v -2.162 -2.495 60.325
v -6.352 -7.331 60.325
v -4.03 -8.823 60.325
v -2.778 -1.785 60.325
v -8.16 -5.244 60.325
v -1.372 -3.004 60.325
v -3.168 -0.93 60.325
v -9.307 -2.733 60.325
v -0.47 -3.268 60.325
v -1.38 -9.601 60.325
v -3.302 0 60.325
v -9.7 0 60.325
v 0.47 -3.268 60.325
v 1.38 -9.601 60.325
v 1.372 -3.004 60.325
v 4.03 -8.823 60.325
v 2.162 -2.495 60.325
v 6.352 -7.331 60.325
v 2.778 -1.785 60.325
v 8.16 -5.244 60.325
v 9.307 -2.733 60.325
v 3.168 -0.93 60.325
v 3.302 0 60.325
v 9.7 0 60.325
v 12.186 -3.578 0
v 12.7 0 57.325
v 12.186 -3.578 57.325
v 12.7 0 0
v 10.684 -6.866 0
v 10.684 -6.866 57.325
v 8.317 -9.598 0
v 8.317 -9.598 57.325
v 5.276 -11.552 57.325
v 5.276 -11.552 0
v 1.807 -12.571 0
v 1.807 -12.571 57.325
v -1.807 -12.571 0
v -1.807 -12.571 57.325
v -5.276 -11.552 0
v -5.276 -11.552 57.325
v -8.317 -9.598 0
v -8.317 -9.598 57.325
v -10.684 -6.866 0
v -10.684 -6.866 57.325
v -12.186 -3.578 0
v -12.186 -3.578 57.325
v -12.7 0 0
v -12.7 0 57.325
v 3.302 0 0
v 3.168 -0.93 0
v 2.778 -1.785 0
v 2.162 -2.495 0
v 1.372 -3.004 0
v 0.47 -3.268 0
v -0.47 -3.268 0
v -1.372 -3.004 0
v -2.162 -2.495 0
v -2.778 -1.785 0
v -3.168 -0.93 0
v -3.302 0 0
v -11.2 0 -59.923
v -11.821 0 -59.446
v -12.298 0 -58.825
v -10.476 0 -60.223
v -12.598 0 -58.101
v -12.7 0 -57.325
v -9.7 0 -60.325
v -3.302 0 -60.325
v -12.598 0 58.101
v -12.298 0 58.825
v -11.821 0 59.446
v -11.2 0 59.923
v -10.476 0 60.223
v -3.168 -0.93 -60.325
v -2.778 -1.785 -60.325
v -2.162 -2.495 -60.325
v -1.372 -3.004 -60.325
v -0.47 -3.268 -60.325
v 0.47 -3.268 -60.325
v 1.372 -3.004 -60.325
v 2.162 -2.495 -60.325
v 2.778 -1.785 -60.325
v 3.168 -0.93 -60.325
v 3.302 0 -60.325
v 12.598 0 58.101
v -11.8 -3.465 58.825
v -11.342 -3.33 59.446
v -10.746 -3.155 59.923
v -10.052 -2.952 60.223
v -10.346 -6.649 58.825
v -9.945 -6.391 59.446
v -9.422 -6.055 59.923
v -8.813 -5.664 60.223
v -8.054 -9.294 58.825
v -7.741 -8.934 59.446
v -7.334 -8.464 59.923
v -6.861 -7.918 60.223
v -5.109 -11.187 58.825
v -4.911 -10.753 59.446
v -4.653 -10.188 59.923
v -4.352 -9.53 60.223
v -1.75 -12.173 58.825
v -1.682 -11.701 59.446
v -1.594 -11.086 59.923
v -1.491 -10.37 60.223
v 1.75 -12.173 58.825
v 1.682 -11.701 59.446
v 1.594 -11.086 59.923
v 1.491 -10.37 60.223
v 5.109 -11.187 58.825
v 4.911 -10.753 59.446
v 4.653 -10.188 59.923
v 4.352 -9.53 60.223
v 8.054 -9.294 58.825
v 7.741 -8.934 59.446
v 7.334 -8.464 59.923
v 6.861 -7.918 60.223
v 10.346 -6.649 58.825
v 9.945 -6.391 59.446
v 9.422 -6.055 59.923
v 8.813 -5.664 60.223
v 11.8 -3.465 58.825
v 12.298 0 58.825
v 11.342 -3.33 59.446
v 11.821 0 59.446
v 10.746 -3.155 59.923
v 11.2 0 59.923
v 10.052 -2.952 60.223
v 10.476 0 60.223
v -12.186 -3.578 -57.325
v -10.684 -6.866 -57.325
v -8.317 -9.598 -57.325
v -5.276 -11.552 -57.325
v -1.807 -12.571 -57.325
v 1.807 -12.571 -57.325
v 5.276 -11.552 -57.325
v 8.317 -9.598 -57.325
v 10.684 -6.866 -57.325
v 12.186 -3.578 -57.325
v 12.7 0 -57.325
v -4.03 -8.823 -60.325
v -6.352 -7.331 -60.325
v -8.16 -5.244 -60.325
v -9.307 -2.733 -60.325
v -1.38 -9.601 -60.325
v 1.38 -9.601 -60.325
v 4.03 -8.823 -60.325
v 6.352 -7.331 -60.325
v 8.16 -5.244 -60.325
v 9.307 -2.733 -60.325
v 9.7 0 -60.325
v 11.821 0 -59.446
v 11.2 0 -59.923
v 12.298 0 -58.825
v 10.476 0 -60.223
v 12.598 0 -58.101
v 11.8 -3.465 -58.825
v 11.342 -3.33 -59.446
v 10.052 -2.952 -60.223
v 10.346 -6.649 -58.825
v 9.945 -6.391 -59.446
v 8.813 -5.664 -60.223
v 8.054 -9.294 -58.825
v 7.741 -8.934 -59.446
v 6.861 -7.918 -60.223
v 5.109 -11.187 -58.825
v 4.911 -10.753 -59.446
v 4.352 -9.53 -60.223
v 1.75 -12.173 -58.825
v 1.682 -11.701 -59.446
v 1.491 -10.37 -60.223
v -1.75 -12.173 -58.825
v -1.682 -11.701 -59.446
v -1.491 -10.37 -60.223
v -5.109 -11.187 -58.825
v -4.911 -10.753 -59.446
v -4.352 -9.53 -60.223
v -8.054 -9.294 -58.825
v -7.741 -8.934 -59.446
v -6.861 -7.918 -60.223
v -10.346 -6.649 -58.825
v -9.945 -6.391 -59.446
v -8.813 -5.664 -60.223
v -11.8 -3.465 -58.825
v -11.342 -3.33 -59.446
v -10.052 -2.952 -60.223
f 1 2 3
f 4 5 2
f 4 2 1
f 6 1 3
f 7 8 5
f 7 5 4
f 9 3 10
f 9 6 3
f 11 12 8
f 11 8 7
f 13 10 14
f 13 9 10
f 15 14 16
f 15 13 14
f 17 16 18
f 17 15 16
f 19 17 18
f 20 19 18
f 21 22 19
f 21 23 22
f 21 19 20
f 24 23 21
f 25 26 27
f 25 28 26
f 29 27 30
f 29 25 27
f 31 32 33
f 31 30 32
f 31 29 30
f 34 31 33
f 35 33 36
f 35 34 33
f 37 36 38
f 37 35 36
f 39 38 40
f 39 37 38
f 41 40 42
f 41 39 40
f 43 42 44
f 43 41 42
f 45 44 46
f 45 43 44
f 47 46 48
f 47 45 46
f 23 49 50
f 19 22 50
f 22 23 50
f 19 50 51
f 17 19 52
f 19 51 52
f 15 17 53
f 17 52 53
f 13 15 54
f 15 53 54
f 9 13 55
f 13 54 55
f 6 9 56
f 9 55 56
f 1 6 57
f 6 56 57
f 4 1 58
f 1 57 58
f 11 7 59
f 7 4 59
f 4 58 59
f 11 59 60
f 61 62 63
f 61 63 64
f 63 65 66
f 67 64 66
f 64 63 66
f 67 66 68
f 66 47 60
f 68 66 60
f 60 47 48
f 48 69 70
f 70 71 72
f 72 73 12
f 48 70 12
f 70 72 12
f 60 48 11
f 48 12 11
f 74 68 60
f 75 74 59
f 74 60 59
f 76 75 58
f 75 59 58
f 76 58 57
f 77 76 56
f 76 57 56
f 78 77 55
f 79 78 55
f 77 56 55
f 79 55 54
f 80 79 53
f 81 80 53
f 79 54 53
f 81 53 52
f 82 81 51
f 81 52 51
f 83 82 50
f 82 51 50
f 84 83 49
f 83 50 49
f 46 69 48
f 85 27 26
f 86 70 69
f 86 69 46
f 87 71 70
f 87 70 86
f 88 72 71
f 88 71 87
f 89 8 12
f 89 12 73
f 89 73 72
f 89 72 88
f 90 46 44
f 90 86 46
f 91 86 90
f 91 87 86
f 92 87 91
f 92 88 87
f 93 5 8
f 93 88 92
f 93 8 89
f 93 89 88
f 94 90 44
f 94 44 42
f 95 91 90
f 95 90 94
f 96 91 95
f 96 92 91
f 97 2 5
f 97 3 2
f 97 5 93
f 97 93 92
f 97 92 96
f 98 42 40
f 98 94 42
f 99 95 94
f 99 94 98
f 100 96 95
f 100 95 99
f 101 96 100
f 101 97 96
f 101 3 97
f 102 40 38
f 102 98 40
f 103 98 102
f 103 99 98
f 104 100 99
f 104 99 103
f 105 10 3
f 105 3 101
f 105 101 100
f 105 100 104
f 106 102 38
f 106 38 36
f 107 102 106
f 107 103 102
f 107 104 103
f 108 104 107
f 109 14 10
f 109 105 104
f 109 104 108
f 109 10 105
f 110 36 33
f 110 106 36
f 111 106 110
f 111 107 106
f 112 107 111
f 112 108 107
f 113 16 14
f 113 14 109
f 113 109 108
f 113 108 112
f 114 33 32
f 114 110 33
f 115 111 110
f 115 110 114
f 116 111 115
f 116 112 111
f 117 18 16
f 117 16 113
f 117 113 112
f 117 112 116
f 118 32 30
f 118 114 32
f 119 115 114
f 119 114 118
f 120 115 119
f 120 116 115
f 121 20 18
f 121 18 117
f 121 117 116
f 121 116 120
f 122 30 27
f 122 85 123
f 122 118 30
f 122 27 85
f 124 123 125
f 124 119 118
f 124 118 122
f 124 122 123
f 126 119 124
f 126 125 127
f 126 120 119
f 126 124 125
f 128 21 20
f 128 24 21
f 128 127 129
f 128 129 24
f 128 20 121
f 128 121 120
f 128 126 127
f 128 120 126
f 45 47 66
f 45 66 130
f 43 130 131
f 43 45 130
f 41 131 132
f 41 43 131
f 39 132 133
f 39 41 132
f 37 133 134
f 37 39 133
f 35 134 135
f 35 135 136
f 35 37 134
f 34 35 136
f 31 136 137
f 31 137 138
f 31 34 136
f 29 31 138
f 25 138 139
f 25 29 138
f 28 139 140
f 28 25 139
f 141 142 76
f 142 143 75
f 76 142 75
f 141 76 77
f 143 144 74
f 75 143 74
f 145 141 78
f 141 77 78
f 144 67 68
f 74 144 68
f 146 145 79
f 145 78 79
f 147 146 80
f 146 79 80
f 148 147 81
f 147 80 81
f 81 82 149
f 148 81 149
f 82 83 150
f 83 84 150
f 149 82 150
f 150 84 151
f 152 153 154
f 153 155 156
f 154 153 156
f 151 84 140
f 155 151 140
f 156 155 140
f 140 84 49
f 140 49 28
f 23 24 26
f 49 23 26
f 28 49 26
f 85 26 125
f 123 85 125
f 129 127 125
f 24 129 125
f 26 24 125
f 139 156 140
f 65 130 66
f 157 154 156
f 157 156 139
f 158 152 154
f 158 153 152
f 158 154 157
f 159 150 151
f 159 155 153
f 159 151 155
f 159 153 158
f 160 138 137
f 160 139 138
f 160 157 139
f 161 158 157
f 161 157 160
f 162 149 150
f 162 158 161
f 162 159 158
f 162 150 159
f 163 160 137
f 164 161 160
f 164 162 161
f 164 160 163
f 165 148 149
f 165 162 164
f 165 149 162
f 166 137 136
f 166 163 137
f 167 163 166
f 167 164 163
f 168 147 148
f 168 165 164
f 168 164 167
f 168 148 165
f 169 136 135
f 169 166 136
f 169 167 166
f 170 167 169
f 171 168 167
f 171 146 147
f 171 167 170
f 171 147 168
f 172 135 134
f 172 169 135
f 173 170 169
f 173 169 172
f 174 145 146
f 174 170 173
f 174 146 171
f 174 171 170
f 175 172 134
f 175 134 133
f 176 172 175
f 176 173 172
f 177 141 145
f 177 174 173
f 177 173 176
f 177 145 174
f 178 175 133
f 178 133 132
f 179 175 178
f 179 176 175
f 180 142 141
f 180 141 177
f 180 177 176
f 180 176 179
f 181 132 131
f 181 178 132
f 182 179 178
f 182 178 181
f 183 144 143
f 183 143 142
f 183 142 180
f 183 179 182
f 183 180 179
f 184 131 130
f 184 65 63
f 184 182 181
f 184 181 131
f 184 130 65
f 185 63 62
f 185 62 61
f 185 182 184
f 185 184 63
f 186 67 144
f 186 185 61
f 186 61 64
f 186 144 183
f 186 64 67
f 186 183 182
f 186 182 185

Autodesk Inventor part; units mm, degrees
ref_plane "YZ Plane" through (0, 0, 0) normal (1, 0, 0) x (0, 1, 0)
ref_plane "XZ Plane" through (0, 0, 0) normal (0, 1, 0) x (-1, 0, 0)
ref_plane "XY Plane" through (0, 0, 0) normal (0, 0, 1) x (1, 0, 0)
sketch "Sketch1" plane through (0, 0, 0) normal (0, 0, 1) x (1, 0, 0)
  circle A0 centre (0, 0) radius 12.7
  circle A1 centre (0, 0) radius 3.302
  dimension "d0" = 25.4
  dimension "d1" = 6.604
extrude "Extrusion1" add sketch "Sketch1" along normal mid plane 120.65
fillet "Fillet1" radius 3 2 edges at (-12.7, 0, 60.325) (-12.7, 0, -60.325)
sketch "Sketch3" plane through (0, 0, 60.325) normal (0, 0, 1) x (1, 0, 0)
  line L0 (-31, 0) -> (39, 0)
  line L1 (39, 0) -> (17, 30)
  line L2 (17, 30) -> (-16, 29)
  line L3 (-16, 29) -> (-31, 0)
extrude "Extrusion2" cut sketch "Sketch3" against normal through all
properties part number "Wagon Hand Handle V03"
